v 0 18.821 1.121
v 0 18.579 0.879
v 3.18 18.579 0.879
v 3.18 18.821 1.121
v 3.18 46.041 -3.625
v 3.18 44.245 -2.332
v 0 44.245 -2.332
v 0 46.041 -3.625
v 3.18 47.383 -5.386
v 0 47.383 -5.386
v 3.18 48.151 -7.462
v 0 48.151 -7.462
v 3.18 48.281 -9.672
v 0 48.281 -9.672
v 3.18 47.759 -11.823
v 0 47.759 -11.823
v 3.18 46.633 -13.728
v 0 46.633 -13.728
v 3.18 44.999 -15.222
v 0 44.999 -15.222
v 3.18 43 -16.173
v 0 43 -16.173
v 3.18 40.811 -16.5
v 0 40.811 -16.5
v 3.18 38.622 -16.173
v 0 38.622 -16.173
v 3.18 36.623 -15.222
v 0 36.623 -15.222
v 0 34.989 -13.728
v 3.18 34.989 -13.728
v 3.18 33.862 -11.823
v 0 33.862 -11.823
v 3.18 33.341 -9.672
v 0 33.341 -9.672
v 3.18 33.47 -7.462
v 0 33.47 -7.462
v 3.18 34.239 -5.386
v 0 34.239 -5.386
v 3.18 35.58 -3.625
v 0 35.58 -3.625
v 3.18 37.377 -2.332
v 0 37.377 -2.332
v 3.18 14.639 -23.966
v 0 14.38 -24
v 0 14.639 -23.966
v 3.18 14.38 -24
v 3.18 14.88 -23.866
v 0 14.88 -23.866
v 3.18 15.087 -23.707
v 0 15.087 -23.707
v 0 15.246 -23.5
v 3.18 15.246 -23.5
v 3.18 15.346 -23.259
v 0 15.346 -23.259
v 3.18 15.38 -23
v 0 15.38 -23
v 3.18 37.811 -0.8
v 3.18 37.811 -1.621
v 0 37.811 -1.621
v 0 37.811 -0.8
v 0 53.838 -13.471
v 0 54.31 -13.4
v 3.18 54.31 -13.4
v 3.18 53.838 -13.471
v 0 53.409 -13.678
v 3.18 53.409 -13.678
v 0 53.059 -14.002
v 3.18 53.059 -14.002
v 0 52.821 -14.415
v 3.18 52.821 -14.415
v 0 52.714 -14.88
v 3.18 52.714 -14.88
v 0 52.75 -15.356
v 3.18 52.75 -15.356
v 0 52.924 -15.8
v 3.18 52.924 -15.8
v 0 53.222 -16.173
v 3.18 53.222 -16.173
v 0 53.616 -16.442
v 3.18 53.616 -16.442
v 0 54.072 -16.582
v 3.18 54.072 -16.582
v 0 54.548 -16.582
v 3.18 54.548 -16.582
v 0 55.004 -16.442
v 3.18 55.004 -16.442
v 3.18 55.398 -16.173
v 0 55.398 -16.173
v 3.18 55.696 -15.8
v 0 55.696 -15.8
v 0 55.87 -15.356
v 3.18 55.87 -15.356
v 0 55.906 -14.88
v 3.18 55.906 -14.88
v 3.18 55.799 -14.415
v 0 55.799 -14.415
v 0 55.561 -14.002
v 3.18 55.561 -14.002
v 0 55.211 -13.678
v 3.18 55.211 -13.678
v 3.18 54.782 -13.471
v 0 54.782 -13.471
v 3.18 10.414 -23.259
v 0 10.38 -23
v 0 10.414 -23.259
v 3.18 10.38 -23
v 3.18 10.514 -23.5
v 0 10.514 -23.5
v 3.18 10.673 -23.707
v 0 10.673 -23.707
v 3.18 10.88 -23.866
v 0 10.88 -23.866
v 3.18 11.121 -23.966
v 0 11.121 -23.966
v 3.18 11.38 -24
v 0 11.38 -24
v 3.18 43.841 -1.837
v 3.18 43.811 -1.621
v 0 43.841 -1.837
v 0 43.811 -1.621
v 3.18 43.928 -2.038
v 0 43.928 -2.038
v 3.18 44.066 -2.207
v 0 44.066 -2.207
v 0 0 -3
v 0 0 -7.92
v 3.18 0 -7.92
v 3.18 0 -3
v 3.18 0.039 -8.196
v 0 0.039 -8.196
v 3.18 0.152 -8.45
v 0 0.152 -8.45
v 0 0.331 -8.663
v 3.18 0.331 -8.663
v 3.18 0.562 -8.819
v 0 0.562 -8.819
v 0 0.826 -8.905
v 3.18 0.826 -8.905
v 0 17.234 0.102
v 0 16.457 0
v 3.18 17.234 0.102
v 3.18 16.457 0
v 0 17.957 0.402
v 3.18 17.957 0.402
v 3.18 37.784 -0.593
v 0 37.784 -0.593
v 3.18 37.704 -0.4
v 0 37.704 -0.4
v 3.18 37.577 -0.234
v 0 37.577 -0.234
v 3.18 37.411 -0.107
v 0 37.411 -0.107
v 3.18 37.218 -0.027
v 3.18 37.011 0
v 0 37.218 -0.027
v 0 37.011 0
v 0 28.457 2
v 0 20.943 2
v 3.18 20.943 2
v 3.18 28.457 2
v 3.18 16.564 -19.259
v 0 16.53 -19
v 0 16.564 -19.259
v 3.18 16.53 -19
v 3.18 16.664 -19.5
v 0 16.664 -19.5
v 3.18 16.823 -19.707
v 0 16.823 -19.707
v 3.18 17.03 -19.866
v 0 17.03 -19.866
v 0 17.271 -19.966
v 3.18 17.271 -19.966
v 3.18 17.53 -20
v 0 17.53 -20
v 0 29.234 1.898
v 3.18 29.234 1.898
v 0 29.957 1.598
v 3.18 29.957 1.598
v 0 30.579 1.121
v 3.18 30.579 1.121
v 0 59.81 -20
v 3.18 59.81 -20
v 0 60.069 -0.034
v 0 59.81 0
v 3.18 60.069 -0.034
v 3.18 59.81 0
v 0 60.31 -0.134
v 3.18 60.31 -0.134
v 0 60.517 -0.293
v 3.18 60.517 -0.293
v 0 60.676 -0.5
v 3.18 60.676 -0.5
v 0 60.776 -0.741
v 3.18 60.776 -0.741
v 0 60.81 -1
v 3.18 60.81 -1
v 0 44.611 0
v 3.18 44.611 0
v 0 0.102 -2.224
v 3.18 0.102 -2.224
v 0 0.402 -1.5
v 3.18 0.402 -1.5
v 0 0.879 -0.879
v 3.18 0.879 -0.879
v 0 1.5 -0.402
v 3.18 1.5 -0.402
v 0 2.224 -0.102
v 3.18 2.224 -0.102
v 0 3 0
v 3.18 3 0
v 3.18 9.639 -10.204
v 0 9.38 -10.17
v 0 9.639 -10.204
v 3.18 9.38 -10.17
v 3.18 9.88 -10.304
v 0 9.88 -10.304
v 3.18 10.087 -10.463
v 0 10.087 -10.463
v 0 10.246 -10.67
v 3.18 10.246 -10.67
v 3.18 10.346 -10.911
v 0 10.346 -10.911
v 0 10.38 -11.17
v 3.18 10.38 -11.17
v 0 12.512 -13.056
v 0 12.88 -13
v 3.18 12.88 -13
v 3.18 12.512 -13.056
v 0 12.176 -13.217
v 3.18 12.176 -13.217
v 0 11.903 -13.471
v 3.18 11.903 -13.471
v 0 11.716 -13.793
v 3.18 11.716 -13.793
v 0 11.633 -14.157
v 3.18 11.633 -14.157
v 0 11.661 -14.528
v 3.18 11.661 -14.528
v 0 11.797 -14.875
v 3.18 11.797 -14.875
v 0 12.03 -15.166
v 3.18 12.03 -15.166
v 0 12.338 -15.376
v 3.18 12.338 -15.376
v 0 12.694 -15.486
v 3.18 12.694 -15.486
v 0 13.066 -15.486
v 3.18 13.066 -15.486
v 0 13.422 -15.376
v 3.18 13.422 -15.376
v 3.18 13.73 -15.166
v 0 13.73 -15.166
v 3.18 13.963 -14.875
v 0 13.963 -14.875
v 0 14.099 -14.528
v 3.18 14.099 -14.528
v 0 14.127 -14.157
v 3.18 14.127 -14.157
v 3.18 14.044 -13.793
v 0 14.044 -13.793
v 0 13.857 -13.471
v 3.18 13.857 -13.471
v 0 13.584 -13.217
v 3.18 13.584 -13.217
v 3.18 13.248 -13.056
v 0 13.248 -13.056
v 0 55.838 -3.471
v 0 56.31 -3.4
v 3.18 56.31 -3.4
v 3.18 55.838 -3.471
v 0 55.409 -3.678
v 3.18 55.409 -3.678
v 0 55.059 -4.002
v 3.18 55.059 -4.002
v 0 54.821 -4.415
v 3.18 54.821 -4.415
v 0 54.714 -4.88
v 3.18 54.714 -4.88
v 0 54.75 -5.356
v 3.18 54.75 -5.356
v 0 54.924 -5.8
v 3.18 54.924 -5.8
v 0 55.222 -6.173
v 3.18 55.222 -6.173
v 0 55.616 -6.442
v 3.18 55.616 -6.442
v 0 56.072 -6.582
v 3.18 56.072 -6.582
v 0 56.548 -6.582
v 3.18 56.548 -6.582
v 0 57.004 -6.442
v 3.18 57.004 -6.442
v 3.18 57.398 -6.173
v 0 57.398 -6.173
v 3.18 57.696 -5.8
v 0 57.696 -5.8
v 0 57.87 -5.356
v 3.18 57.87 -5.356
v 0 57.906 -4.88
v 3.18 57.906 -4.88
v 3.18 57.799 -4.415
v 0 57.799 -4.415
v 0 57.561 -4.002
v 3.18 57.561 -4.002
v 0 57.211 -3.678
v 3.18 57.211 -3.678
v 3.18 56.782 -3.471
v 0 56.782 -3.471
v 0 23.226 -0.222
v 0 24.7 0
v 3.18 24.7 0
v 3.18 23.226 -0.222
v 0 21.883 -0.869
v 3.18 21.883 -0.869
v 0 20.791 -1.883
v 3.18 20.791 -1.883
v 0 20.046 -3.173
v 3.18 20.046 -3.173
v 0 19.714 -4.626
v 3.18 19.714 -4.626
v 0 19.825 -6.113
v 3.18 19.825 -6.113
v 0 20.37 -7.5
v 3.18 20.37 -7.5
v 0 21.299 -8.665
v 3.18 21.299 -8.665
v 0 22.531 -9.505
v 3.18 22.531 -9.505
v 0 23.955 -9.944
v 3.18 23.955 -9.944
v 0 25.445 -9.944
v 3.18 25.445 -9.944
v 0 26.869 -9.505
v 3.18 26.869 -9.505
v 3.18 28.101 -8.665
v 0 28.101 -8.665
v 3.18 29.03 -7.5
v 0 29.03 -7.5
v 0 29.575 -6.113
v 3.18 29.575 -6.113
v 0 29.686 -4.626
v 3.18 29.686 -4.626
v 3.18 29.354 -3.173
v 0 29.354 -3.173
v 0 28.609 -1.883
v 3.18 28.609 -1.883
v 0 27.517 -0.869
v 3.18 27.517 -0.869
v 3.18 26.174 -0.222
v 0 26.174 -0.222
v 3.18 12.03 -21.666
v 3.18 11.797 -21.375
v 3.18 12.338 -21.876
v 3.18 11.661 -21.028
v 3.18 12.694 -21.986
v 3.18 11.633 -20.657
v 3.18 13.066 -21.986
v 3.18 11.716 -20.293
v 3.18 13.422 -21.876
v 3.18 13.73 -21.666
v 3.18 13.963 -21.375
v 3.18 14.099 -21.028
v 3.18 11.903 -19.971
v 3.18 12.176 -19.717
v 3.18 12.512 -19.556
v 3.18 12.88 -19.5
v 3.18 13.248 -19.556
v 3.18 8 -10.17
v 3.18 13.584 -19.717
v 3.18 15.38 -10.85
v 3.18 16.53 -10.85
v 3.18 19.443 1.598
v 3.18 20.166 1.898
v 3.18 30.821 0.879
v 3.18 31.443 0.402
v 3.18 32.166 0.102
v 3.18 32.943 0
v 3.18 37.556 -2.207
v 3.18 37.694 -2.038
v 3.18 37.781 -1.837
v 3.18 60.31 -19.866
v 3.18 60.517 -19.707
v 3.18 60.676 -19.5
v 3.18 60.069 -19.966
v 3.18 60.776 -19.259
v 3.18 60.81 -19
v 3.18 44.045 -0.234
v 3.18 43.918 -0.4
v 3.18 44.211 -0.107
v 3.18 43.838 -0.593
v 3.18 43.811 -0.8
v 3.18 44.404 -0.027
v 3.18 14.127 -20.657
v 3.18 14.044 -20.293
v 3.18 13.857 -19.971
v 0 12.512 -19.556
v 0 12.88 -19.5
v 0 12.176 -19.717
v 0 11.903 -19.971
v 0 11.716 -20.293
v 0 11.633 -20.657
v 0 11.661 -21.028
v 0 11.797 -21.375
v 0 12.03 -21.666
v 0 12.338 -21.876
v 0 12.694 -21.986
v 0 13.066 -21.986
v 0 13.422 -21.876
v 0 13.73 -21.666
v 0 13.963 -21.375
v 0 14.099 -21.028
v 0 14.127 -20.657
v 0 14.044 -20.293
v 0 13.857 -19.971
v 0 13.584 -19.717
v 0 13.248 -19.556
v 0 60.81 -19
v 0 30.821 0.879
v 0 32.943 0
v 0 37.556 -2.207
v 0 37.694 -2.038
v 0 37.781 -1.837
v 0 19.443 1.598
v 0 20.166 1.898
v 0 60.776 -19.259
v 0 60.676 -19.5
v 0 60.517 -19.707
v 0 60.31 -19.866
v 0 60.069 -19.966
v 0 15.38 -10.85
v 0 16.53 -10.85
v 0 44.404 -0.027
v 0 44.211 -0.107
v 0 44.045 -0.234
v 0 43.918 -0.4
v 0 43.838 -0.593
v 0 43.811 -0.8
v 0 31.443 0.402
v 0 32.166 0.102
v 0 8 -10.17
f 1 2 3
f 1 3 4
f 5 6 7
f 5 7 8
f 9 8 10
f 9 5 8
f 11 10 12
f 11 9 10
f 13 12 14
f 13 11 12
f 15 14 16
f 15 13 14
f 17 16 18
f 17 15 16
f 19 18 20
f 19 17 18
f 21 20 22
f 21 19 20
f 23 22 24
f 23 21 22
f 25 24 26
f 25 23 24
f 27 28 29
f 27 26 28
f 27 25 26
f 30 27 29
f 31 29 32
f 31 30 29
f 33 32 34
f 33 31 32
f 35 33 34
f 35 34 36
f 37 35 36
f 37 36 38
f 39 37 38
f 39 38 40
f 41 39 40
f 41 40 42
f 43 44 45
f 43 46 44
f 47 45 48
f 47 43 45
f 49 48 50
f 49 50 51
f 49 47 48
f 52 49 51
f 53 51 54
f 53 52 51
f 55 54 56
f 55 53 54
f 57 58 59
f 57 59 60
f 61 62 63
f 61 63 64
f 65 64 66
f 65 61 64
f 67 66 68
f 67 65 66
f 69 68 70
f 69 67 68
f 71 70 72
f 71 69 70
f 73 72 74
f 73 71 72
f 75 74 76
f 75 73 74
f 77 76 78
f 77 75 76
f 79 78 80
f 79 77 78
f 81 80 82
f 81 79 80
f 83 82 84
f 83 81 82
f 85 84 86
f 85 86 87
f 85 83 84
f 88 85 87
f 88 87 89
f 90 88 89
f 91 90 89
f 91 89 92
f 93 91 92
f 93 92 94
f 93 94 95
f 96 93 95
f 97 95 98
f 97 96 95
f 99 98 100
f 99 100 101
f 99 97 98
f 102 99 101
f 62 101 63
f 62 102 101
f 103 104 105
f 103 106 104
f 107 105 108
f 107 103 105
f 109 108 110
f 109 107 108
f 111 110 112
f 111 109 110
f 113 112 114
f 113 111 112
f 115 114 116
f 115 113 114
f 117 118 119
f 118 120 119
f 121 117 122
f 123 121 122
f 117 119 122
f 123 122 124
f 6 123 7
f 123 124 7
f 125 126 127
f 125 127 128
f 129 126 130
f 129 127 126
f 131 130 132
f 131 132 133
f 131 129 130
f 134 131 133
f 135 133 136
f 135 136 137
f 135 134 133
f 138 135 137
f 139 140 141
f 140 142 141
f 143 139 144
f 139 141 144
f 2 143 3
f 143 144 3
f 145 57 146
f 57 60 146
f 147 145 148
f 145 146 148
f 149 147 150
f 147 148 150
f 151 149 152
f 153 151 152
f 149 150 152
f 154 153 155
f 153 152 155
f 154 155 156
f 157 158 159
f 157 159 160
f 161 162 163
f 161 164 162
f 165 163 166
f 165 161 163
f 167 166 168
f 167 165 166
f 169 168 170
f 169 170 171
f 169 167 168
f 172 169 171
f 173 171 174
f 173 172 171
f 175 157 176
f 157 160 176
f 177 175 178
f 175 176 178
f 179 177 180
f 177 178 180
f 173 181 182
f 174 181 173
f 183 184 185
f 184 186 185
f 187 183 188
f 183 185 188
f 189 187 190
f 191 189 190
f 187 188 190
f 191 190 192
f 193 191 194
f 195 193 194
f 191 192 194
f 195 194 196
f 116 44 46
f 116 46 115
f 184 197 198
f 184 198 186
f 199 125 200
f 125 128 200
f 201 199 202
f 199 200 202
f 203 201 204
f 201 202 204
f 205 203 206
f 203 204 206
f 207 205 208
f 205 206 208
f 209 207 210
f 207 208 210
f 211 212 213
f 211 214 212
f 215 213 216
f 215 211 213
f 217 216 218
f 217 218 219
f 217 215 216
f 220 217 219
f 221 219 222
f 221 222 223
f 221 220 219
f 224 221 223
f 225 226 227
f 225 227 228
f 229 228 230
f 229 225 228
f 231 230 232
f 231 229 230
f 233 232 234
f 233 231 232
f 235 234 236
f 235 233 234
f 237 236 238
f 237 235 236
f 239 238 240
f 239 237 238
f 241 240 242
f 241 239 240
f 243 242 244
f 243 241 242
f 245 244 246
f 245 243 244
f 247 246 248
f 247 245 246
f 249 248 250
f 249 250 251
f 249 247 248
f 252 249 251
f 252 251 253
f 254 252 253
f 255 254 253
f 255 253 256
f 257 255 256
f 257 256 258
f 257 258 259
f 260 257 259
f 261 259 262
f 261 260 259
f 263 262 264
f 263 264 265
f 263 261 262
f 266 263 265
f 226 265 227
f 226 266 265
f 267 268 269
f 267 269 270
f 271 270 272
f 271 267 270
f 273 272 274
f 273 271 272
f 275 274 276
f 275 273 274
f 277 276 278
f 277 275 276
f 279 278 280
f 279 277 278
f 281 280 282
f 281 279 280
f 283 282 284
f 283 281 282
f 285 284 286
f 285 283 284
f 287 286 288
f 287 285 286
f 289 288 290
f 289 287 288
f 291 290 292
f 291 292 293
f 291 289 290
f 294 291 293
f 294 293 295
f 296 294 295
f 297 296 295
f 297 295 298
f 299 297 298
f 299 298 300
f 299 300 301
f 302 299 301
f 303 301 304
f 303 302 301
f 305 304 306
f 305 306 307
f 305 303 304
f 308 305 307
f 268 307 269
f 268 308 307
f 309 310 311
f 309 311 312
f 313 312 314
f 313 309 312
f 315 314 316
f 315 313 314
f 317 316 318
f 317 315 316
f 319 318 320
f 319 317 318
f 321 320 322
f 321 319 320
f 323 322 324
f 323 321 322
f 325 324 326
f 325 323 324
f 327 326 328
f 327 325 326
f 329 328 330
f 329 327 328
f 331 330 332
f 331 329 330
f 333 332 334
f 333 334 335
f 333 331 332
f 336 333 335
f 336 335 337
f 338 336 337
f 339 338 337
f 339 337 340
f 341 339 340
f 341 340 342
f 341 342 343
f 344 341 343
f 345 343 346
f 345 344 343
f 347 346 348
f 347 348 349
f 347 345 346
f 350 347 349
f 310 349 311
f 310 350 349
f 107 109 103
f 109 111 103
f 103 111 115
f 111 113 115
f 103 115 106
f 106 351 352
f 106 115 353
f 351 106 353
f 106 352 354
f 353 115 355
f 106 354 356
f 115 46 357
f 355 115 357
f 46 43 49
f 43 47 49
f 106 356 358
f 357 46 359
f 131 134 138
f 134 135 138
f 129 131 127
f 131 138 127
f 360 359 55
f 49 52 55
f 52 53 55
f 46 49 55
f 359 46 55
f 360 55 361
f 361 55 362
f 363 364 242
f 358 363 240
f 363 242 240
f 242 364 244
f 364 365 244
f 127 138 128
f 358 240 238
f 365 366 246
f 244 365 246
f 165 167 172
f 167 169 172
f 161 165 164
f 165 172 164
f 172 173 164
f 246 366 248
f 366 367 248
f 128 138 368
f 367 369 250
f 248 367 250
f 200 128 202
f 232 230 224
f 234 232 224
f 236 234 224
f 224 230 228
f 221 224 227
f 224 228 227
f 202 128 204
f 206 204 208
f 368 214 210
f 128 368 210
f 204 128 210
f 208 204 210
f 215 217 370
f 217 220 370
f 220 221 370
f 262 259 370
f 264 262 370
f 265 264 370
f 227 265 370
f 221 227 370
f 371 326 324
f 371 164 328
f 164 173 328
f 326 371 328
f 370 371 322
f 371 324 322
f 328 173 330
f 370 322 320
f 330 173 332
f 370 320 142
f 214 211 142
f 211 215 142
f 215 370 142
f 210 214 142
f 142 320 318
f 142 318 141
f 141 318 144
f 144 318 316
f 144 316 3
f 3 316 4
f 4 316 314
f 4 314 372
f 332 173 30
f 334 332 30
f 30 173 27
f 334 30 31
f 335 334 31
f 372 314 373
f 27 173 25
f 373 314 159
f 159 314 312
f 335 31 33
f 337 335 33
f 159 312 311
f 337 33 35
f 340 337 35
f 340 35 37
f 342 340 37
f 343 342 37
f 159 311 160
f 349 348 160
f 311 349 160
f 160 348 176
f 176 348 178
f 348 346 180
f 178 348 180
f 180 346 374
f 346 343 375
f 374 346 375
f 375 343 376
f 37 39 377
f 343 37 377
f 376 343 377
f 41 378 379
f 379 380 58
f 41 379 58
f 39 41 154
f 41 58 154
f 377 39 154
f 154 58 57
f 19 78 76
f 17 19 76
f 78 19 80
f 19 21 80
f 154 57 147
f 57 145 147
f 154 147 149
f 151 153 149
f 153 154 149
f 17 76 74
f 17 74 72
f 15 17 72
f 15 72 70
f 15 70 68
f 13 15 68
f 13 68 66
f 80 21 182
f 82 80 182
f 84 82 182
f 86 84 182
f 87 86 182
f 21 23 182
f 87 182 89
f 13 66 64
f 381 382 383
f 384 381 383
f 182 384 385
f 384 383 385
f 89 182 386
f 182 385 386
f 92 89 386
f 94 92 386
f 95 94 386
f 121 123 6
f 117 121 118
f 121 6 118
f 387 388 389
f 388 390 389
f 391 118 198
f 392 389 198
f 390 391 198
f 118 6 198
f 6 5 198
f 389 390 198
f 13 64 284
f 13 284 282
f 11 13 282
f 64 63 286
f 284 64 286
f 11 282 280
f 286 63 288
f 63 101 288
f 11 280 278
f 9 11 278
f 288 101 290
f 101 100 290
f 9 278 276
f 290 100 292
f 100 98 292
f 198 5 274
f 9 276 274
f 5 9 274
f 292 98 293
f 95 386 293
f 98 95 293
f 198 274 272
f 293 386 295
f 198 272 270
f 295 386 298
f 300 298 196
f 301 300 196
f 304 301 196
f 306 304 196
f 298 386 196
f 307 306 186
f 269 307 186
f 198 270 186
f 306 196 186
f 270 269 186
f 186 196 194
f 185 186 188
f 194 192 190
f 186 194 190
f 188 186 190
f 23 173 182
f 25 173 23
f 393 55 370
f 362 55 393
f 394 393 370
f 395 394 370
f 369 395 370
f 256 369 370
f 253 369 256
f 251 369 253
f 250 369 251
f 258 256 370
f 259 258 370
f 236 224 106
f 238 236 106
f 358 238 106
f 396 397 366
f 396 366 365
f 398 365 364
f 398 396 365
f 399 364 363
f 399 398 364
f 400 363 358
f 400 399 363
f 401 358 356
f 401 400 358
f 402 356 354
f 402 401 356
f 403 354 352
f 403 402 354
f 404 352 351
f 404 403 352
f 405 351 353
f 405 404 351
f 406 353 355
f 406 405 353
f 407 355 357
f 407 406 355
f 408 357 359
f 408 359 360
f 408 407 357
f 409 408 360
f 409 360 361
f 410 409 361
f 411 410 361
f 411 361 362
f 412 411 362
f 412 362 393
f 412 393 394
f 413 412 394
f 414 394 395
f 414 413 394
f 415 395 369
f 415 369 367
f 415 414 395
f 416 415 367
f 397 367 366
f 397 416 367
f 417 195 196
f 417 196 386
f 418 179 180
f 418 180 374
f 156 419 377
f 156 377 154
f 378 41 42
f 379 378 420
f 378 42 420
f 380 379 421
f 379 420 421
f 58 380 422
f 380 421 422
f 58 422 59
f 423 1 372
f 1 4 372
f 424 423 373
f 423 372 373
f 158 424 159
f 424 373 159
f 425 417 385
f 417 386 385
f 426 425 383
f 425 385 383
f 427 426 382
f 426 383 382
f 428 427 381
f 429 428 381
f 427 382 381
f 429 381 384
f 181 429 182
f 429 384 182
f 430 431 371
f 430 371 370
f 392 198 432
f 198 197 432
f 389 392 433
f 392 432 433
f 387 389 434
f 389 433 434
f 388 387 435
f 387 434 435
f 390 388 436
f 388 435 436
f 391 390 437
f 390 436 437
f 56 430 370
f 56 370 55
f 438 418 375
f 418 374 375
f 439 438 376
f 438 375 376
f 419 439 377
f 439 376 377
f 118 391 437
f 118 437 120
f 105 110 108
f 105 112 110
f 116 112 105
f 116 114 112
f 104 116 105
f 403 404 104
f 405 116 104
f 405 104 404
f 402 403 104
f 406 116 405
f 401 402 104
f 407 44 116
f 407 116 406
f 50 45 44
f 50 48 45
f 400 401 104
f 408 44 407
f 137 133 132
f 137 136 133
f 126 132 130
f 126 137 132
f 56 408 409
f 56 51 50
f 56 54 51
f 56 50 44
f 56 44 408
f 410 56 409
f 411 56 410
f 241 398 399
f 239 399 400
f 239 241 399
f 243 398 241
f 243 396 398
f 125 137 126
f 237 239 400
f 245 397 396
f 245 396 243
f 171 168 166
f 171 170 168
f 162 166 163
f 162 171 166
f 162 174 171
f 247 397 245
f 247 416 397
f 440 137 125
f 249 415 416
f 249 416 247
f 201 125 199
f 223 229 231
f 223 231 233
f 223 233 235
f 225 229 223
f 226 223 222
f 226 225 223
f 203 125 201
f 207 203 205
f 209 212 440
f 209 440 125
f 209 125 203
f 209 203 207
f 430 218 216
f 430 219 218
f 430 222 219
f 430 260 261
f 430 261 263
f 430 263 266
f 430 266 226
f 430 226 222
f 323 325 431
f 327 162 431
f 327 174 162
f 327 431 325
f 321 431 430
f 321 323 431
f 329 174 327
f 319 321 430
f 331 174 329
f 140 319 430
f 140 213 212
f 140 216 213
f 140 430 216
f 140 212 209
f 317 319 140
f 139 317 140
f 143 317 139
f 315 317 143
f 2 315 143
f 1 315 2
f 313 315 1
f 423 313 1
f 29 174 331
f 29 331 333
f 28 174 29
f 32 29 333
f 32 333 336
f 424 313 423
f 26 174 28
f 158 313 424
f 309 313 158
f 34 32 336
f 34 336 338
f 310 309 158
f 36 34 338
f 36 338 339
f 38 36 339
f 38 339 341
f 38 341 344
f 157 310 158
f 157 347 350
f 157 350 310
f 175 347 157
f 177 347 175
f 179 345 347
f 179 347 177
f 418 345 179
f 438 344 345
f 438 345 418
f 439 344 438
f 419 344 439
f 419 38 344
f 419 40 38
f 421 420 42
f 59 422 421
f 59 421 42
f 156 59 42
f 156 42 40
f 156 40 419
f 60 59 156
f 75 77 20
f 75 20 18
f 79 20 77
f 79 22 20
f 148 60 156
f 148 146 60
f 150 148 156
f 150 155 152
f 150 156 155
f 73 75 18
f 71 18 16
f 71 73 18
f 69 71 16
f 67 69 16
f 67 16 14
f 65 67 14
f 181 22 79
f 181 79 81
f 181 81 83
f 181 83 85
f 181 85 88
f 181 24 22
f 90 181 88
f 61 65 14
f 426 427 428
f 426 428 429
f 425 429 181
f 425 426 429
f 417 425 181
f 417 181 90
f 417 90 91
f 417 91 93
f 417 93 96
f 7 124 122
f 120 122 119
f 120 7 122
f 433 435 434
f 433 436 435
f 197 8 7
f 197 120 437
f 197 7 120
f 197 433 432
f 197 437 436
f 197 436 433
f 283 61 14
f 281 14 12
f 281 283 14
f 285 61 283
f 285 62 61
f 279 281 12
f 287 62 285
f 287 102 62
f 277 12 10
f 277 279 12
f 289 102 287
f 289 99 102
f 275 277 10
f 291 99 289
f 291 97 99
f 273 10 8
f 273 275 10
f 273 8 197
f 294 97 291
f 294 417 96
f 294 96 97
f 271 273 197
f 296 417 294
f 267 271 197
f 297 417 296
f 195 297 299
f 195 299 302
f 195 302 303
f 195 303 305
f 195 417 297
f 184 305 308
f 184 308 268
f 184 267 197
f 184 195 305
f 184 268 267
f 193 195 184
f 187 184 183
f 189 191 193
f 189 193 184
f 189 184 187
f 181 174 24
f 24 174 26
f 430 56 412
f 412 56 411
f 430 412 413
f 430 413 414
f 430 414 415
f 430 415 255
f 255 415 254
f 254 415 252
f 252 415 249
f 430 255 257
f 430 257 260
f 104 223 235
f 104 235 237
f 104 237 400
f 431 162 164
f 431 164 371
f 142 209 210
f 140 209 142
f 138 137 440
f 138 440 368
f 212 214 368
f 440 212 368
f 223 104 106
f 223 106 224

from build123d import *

# Parameters (mm, degrees)
SKETCH1_R           = 5
SKETCH1_R_2         = 1.6
SKETCH1_R_3         = 1.25
BOSS_EXTRUDE1_DEPTH = 3.18
CHAMFER1_SIZE       = 8
CHAMFER1_SIZE2      = 1.410615846
FILLET1_R           = 1
FILLET2_R           = 3
CUT_EXTRUDE5_DEPTH  = 66.452032054
FILLET3_R           = 0.8


with BuildPart() as part:
    # Sketch1 → Boss-Extrude1 (new body)
    with BuildSketch(Plane(origin=(0, 0, 0), x_dir=(0, 0, -1), z_dir=(1, 0, 0))):
        Polygon((0, 0), (0, 17.7), (-2, 19.7), (-2, 29.7), (0, 31.7), (0, 60.81), (20, 60.81), (20, 16.53), (10.85, 16.53), (10.85, 15.38), (24, 15.38), (24, 10.38), (10.17, 10.38), (10.17, 0), align=None)
        with Locations(Location((5, 24.7, 0), (0, 0, 180))):
            Circle(SKETCH1_R, mode=Mode.SUBTRACT)
        with Locations(Location((5, 56.31, 0), (0, 0, 180))):
            Circle(SKETCH1_R_2, mode=Mode.SUBTRACT)
        with Locations(Location((15, 54.31, 0), (0, 0, 180))):
            Circle(SKETCH1_R_2, mode=Mode.SUBTRACT)
        with Locations(Location((20.75, 12.88, 0), (0, 0, 180))):
            Circle(SKETCH1_R_3, mode=Mode.SUBTRACT)
        with Locations(Location((14.25, 12.88, 0), (0, 0, 180))):
            Circle(SKETCH1_R_3, mode=Mode.SUBTRACT)
    extrude(amount=BOSS_EXTRUDE1_DEPTH)

    # Chamfer1
    chamfer1_edges = [part.edges().sort_by_distance(p)[0] for p in [
        (1.59, 0, -10.17),
    ]]
    chamfer1_side = [part.faces().sort_by_distance(p)[0] for p in [
        (1.59, 5.19, -10.17),
    ]]
    chamfer(chamfer1_edges, length=CHAMFER1_SIZE, length2=CHAMFER1_SIZE2, reference=chamfer1_side[0])

    # Fillet1
    fillet1_edges = [part.edges().sort_by_distance(p)[0] for p in [
        (1.59, 60.81, 0),
        (1.59, 60.81, -20),
        (1.59, 16.53, -20),
        (1.59, 15.38, -24),
        (1.59, 10.38, -24),
        (1.59, 10.38, -10.17),
        (1.59, 0, -8.759384154),
    ]]
    fillet(fillet1_edges, radius=FILLET1_R)

    # Fillet2
    fillet2_edges = [part.edges().sort_by_distance(p)[0] for p in [
        (1.59, 0, 0),
        (1.59, 17.7, 0),
        (1.59, 19.7, 2),
        (1.59, 29.7, 2),
        (1.59, 31.7, 0),
    ]]
    fillet(fillet2_edges, radius=FILLET2_R)

    # Sketch8 → Cut-Extrude5 (cut, through all)
    with BuildSketch(Plane(origin=(3.18, 0, 0), x_dir=(0, 0, -1), z_dir=(1, 0, 0))):
        with BuildLine():
            Line((0, 43.810865899), (2.126136458, 43.810865899))
            ThreePointArc((2.126136458, 43.810865899), (16.5, 40.810865899), (2.126136458, 37.810865899))
            Line((2.126136458, 37.810865899), (0, 37.810865899))
            Line((0, 37.810865899), (0, 43.810865899))
        make_face()
    extrude(amount=-CUT_EXTRUDE5_DEPTH, mode=Mode.SUBTRACT)

    # Fillet3
    fillet3_edges = [part.edges().sort_by_distance(p)[0] for p in [
        (1.59, 37.810865899, 0),
        (1.59, 43.810865899, 0),
        (1.59, 43.810865899, -2.126136458),
        (1.59, 37.810865899, -2.126136458),
    ]]
    fillet(fillet3_edges, radius=FILLET3_R)


solid = part.part
